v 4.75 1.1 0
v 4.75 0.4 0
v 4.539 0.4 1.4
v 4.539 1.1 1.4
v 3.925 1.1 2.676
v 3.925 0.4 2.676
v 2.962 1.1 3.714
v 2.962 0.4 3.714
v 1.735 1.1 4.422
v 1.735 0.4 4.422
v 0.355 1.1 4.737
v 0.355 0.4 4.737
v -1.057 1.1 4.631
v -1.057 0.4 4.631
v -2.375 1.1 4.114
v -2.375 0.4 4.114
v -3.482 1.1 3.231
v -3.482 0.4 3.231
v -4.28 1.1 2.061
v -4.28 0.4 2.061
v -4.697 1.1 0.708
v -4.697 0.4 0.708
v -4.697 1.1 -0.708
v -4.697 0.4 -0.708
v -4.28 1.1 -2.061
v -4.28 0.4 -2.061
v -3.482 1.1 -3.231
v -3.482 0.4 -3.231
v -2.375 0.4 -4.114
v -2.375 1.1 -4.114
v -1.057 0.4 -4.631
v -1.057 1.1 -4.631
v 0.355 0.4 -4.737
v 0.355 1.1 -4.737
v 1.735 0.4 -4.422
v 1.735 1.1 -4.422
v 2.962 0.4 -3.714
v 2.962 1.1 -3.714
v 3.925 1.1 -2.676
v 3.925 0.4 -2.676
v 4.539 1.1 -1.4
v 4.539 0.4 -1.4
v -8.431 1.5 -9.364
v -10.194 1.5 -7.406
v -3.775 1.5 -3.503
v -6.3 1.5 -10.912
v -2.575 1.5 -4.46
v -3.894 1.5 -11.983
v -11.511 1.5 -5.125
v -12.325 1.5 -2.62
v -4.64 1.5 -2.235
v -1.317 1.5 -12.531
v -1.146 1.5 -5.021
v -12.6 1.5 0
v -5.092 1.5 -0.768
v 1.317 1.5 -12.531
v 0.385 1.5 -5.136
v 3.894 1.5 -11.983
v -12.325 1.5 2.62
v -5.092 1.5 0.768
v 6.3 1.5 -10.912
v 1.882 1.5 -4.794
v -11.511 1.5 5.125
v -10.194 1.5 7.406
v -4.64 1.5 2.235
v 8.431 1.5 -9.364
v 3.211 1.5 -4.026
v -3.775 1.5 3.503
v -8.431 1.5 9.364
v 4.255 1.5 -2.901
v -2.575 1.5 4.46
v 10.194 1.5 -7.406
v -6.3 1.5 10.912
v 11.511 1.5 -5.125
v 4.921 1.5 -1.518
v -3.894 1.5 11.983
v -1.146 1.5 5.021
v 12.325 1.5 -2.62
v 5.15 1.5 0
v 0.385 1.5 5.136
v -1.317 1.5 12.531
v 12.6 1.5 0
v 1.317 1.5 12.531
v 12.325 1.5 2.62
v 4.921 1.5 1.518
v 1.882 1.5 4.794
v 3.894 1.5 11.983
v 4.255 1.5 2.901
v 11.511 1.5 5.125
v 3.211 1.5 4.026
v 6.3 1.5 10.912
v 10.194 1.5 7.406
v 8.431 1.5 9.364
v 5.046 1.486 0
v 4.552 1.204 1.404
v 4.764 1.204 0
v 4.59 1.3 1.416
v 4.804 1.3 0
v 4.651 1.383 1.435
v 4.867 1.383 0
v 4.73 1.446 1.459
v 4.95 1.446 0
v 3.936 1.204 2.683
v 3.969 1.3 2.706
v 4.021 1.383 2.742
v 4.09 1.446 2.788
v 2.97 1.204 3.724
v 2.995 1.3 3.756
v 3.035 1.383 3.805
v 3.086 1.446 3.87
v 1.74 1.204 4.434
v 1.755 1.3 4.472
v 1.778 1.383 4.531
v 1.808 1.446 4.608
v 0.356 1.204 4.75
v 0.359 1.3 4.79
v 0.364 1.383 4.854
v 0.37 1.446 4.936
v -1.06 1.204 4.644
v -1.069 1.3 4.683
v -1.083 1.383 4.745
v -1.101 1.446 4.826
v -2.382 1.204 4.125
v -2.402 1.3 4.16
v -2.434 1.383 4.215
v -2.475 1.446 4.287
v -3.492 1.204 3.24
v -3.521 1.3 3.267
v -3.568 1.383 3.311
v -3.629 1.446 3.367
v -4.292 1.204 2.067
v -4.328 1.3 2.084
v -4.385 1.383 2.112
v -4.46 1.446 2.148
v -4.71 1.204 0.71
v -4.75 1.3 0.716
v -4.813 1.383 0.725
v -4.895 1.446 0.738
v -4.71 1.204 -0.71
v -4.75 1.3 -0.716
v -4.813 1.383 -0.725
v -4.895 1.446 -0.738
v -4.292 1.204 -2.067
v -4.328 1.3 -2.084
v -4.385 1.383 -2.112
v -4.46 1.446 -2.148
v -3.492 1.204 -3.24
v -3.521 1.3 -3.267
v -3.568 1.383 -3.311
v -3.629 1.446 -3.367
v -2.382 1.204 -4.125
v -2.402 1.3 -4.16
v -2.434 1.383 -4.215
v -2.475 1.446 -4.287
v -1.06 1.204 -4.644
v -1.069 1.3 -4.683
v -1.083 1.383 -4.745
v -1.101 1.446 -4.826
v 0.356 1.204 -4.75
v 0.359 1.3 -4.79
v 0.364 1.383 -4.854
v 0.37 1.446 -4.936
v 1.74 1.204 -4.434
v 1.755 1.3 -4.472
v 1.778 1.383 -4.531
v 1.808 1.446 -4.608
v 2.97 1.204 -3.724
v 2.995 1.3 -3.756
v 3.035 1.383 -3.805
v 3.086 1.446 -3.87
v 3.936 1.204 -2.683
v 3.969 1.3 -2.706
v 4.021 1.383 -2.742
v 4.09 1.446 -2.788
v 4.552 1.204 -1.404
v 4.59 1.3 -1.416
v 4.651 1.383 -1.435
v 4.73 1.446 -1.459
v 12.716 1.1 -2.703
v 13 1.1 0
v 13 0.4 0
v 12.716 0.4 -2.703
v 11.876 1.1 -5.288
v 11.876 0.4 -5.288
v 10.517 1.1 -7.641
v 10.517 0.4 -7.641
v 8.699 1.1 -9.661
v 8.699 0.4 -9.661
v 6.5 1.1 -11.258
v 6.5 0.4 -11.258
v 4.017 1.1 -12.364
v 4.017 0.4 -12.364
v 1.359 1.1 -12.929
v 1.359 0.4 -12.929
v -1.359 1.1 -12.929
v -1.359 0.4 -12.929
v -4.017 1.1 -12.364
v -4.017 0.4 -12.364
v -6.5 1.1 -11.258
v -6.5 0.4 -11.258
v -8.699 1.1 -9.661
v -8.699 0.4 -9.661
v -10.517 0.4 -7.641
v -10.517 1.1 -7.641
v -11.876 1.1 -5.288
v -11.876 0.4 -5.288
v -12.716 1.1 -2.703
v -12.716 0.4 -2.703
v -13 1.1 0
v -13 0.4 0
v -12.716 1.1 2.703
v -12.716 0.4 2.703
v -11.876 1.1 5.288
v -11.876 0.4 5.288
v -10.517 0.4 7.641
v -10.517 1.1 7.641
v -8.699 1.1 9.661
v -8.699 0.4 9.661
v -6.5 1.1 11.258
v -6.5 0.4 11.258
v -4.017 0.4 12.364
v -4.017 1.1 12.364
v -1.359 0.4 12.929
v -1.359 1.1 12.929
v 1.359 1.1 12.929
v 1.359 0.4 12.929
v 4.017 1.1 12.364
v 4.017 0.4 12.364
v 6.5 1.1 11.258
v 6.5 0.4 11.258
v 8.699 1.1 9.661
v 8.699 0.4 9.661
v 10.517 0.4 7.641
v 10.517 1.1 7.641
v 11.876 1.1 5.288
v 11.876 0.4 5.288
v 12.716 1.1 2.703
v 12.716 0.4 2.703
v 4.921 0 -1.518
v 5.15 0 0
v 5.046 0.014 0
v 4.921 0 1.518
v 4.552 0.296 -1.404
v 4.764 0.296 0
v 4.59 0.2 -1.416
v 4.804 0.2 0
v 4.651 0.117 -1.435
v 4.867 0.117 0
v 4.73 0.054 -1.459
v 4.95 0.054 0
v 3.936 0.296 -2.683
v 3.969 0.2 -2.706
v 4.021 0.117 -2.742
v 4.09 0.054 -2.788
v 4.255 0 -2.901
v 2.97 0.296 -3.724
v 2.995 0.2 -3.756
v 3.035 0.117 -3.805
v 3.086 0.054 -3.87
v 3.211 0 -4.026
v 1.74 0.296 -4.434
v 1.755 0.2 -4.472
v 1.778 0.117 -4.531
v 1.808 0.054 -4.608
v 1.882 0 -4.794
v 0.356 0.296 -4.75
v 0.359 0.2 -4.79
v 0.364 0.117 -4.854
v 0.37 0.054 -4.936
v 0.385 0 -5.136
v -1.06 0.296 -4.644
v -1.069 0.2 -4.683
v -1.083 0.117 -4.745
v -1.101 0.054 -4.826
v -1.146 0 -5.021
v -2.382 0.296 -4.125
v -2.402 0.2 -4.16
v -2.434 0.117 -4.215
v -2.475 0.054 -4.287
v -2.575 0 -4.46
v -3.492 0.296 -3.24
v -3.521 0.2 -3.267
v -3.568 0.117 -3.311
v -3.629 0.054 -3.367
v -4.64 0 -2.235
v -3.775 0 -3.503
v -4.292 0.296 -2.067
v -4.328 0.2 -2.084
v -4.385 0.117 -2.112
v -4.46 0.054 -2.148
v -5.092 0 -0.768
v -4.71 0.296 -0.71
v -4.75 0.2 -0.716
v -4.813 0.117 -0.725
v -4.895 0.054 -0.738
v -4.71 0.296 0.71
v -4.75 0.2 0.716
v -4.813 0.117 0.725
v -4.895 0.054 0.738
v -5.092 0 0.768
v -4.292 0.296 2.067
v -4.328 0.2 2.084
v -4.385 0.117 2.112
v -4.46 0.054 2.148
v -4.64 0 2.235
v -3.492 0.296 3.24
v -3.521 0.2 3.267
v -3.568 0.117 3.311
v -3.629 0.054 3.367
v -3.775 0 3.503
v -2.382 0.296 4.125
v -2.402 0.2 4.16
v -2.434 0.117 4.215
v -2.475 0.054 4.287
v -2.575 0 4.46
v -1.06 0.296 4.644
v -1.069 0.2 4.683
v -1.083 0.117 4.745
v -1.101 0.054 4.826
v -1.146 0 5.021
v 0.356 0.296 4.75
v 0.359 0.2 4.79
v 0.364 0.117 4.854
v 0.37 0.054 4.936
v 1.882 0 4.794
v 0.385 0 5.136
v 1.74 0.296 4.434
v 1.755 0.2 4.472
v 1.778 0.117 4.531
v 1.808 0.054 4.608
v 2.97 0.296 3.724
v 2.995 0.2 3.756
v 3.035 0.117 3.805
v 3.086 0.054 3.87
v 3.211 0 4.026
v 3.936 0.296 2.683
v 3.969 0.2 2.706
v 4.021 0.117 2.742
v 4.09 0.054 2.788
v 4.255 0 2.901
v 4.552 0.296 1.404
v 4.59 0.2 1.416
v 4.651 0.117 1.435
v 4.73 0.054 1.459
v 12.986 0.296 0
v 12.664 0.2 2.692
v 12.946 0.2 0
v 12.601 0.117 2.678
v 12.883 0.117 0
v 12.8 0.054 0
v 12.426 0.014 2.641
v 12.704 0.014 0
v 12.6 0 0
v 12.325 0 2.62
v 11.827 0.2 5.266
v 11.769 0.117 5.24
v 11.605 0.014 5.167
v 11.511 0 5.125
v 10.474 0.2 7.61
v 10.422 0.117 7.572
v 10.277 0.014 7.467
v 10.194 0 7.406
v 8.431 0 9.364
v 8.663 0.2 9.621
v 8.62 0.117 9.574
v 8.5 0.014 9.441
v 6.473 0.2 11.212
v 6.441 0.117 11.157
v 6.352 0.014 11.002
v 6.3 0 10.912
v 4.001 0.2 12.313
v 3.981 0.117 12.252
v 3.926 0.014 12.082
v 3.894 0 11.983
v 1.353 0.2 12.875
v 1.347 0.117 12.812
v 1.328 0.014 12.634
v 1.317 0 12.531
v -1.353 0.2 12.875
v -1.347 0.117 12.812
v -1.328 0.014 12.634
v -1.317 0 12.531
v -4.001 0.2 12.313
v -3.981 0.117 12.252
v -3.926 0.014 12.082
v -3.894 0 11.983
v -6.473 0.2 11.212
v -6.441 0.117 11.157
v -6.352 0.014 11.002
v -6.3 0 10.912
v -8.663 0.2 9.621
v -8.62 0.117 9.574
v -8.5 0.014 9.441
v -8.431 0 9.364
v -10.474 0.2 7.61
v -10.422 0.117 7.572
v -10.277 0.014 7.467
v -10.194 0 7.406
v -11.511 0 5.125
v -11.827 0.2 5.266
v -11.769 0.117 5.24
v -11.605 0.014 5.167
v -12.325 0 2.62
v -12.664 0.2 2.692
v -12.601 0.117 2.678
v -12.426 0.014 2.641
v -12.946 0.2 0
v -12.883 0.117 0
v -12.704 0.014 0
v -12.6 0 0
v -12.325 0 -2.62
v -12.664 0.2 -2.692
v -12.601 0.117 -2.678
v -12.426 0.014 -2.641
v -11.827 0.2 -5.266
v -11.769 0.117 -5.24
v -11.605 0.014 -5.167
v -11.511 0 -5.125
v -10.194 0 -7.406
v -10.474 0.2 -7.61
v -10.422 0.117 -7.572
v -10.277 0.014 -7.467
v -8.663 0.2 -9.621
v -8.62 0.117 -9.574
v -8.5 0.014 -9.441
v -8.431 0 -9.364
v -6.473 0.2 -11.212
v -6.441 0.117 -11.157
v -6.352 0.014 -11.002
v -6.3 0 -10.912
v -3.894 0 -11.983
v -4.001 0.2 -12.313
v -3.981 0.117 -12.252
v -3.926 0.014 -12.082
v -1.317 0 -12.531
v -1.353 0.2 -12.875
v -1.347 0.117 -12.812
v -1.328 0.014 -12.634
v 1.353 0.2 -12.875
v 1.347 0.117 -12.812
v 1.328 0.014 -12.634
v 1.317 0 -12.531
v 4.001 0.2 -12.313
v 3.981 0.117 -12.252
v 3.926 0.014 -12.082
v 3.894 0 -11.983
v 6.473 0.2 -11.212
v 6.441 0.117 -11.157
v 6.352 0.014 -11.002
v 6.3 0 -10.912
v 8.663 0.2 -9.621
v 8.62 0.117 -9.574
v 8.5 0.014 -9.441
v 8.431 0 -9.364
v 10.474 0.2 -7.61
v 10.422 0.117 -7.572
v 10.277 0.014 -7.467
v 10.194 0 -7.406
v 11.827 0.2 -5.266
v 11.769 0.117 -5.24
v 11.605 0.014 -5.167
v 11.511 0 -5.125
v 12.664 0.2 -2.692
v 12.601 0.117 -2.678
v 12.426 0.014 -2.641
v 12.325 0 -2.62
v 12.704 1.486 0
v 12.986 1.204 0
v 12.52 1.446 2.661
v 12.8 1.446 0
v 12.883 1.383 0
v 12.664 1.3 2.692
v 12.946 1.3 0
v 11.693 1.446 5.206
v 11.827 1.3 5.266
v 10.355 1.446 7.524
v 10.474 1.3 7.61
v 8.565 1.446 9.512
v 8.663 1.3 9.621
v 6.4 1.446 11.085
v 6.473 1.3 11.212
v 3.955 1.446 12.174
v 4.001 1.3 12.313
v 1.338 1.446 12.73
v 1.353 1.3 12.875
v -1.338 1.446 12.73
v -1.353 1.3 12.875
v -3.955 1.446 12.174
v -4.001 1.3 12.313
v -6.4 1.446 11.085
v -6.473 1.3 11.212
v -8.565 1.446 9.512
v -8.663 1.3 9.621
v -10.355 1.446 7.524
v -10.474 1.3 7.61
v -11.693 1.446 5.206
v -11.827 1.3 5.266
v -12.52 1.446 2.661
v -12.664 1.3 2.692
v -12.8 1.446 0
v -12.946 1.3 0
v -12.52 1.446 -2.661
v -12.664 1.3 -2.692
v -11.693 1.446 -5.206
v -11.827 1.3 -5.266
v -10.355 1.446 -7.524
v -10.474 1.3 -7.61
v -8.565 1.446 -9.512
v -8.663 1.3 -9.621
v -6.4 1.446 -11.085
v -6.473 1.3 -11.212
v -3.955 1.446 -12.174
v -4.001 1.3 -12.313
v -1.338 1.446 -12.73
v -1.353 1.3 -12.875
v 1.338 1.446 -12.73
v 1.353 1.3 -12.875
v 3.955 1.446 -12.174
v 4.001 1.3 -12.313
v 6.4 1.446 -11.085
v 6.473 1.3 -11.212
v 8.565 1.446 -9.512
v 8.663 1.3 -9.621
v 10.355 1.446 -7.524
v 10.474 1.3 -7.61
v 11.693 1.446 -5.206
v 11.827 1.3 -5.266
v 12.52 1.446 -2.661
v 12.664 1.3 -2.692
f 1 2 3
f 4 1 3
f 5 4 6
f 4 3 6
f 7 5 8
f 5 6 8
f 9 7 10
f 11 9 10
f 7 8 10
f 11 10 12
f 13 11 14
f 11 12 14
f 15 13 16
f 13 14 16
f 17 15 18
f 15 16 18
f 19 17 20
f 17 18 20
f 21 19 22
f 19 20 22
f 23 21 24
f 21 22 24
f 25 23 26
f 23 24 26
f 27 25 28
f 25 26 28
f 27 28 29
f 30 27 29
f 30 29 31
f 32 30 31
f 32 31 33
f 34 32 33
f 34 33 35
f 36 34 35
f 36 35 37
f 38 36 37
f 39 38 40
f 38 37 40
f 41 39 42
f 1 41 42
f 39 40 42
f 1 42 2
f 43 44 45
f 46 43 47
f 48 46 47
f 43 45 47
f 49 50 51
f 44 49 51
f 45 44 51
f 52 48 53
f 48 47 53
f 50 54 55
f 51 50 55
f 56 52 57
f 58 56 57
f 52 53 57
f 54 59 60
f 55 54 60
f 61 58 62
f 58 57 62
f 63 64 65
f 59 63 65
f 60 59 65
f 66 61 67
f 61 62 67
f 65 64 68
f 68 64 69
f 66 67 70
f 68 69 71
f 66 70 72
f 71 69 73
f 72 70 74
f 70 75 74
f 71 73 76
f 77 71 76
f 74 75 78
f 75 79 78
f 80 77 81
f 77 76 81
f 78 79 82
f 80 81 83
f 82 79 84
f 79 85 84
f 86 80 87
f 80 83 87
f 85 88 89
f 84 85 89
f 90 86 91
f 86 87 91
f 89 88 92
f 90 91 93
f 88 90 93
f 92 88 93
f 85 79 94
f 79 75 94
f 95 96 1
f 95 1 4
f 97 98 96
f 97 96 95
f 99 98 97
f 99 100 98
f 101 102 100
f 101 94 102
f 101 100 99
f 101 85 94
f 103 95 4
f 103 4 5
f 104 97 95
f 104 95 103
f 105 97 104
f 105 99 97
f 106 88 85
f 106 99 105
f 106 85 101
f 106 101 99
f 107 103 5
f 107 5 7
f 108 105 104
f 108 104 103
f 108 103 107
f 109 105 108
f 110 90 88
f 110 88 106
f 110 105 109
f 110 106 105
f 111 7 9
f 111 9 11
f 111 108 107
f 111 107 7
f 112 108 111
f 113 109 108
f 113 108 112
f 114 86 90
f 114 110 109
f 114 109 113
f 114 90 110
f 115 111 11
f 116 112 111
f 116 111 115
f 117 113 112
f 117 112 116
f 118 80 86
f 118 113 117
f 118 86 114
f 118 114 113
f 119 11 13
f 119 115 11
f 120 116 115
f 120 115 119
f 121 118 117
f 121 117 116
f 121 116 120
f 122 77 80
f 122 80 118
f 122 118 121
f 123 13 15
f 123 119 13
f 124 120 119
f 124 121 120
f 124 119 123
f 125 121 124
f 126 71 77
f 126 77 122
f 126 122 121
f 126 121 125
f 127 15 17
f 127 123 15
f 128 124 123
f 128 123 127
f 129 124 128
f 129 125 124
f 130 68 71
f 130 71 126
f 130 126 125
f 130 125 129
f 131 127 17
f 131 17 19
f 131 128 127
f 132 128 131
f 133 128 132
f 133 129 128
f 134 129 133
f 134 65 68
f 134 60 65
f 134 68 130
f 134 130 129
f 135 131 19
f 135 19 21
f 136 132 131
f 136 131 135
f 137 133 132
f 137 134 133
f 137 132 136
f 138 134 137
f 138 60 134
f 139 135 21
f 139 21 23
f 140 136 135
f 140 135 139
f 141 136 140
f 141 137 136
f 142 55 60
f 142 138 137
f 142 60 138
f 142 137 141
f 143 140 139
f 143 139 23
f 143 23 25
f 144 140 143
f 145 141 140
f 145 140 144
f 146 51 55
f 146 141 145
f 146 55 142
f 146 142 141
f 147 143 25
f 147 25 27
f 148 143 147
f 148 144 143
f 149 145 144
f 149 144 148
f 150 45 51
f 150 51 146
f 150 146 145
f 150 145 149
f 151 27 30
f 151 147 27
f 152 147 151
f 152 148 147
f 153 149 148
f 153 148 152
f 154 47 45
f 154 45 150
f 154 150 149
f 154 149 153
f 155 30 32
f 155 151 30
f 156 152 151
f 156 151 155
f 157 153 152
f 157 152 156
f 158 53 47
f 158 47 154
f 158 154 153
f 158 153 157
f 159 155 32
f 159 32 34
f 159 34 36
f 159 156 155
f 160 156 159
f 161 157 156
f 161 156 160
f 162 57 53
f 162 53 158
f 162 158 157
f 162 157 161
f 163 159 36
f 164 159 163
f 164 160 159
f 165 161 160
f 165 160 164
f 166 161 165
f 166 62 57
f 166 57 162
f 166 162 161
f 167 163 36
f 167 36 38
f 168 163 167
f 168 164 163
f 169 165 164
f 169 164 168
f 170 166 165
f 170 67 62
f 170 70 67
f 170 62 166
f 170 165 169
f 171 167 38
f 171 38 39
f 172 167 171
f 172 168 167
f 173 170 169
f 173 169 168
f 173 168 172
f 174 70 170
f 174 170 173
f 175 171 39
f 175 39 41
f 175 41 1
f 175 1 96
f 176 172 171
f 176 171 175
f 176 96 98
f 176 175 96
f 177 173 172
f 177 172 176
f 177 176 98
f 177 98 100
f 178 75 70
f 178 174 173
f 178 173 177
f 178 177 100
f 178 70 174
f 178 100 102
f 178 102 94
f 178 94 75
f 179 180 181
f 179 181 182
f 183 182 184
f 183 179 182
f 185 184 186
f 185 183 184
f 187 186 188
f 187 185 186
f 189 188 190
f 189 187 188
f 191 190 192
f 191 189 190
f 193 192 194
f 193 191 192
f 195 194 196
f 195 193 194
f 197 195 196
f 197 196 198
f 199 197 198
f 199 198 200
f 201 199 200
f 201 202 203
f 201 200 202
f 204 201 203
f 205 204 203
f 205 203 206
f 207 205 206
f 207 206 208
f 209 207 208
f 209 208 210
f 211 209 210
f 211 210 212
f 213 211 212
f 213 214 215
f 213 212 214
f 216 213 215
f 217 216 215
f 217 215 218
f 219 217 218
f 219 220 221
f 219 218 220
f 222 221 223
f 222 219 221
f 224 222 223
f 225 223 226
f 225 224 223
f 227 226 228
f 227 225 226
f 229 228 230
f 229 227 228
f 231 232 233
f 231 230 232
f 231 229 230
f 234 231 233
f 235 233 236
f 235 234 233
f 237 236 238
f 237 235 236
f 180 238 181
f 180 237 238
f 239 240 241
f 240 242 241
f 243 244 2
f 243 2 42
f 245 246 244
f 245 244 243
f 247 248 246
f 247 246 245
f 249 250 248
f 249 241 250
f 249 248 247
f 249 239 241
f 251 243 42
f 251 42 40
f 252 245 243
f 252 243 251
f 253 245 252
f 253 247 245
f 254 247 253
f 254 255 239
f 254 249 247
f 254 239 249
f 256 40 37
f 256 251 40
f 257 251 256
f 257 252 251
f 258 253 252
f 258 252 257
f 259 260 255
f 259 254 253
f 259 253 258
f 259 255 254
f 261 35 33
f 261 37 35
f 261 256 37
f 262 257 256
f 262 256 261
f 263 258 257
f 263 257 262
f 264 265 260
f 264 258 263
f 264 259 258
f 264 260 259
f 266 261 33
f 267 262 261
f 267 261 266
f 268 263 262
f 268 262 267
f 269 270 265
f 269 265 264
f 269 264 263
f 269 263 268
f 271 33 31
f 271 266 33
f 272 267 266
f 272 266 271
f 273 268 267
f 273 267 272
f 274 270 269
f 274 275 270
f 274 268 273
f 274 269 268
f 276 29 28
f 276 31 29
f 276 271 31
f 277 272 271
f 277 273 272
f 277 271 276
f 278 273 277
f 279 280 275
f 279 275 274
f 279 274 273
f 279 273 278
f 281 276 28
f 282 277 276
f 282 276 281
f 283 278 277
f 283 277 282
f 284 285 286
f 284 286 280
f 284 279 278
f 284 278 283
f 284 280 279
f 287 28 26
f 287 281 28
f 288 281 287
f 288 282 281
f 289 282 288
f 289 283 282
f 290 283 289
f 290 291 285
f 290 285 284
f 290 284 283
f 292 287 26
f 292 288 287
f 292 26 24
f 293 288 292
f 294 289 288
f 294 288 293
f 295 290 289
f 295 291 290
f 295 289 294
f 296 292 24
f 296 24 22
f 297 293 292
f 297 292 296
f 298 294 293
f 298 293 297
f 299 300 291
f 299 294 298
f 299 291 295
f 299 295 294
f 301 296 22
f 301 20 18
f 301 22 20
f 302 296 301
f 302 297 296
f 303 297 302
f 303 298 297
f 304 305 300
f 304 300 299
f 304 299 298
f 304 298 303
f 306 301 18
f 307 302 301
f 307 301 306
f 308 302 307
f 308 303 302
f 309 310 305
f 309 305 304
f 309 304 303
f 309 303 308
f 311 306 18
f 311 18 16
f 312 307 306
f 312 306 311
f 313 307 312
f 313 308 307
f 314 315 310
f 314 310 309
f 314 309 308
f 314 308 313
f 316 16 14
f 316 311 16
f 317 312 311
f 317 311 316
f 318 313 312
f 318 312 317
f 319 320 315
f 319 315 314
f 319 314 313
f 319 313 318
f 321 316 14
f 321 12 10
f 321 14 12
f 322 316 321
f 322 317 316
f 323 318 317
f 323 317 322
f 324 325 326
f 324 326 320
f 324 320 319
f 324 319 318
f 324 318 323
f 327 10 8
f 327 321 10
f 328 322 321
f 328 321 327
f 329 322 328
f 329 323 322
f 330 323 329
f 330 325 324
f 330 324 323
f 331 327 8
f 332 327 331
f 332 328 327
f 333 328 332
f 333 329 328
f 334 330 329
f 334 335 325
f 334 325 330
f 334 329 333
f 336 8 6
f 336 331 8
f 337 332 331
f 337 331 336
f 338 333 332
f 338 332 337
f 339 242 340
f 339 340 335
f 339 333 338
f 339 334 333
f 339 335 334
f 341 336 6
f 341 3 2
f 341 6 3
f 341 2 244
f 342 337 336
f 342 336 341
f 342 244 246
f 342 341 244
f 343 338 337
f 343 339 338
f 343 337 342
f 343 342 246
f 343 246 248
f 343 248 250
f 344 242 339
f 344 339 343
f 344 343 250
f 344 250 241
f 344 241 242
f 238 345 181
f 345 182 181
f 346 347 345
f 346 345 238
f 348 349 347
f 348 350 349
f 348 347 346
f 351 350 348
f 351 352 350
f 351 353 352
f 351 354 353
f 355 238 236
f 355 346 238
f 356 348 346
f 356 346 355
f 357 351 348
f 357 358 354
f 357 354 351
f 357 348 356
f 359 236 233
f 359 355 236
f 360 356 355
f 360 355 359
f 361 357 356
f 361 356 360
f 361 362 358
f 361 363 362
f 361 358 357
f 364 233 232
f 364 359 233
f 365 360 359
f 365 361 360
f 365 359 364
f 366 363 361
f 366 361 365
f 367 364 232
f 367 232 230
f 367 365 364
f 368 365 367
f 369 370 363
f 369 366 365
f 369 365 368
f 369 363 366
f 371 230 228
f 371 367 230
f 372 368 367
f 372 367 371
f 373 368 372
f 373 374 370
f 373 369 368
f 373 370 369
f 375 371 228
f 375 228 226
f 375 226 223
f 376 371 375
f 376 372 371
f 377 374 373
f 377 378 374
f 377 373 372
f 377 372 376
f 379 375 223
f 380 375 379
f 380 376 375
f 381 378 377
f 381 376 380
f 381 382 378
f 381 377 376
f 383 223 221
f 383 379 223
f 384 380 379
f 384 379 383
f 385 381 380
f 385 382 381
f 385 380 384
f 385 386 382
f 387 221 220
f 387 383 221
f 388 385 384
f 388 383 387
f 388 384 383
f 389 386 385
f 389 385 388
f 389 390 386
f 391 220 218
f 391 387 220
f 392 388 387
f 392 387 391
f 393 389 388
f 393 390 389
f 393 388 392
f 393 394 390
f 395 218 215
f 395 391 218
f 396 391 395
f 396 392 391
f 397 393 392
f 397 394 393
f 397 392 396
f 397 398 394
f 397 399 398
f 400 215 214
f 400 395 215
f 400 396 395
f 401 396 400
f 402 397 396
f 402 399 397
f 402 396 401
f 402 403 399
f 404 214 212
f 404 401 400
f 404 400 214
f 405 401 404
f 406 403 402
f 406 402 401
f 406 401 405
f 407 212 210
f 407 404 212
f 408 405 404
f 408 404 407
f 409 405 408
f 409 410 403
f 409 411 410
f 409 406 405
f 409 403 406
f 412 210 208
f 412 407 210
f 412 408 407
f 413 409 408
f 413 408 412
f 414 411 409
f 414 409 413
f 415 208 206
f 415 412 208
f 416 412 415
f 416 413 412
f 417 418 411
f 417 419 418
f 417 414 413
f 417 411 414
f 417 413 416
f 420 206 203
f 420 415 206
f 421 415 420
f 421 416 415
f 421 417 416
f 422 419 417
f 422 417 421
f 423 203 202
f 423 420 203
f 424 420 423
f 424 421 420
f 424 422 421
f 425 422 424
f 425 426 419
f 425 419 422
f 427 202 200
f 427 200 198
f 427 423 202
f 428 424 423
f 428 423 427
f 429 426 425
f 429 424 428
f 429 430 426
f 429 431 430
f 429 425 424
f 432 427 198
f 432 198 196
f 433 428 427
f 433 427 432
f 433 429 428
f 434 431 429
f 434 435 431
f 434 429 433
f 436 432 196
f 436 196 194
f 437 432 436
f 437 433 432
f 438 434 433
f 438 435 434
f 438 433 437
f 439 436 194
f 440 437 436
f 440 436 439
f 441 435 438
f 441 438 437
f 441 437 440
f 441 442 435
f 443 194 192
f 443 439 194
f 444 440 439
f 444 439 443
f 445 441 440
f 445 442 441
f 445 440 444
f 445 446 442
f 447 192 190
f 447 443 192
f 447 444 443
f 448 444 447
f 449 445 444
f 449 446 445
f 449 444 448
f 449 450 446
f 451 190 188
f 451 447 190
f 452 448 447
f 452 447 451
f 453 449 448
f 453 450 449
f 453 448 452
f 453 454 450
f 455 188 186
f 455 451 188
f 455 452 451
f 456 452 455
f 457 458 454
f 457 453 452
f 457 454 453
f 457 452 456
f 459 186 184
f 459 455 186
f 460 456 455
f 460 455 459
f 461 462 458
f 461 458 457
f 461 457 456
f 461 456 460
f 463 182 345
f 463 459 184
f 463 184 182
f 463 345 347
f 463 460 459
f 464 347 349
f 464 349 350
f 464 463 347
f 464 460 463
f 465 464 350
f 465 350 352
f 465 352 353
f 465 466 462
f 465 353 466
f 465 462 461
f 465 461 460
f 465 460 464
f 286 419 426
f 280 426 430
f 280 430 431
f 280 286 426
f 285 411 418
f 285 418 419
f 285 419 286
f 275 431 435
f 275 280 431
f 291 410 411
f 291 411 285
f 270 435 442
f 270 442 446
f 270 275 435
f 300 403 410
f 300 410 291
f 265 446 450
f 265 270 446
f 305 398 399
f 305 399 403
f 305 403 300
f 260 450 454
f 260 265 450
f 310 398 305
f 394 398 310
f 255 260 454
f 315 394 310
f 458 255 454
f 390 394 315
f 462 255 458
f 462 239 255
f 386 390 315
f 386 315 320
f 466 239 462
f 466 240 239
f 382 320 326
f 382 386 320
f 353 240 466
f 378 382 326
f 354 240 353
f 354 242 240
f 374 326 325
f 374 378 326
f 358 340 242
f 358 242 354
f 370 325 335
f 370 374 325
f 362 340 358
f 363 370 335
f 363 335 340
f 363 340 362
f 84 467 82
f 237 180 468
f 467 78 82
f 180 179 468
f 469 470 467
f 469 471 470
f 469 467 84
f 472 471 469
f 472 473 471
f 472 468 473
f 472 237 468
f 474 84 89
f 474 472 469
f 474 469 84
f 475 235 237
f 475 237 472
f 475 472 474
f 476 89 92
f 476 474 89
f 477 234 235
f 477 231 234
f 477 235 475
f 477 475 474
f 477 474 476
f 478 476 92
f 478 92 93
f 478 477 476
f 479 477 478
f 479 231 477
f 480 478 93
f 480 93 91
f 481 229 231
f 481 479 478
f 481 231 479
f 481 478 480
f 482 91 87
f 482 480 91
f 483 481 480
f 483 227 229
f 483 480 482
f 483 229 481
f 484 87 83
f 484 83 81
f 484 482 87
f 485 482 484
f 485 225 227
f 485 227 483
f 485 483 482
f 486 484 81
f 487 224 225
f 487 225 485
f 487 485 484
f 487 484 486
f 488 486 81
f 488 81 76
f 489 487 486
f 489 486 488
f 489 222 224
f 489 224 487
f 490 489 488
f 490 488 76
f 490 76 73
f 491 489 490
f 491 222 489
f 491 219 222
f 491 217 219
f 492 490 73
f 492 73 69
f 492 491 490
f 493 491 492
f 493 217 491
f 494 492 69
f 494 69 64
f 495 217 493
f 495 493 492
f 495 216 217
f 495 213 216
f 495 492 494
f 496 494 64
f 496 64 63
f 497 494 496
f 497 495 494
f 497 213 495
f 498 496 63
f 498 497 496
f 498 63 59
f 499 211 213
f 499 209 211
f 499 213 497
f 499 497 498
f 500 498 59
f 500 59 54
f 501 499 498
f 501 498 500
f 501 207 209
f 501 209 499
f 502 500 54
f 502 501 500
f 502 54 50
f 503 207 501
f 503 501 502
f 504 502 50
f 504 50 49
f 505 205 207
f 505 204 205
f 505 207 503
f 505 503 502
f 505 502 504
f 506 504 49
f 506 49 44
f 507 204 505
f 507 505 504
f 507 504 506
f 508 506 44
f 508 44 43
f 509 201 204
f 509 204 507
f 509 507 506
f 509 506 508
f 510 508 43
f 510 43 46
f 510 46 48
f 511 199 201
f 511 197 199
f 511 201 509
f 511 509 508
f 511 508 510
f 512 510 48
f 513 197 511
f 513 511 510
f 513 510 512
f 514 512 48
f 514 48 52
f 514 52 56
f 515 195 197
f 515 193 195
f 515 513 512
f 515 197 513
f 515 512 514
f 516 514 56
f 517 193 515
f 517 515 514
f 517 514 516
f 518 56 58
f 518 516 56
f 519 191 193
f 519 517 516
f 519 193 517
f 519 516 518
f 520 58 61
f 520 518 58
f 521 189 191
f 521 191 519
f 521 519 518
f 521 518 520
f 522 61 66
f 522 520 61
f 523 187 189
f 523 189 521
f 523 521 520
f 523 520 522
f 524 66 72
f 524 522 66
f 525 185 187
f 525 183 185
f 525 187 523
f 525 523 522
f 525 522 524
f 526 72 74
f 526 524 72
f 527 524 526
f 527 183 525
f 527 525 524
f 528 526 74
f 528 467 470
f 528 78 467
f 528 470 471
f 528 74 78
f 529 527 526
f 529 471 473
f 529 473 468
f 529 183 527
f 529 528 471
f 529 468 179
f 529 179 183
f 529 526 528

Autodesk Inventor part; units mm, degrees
ref_plane "YZ Plane" through (0, 0, 0) normal (1, 0, 0) x (0, 1, 0)
ref_plane "XZ Plane" through (0, 0, 0) normal (0, 1, 0) x (-1, 0, 0)
ref_plane "XY Plane" through (0, 0, 0) normal (0, 0, 1) x (1, 0, 0)
sketch "Эскиз1" plane through (0, 0, 0) normal (0, 0, 1) x (1, 0, 0)
  line L0 (4.75, 0) -> (13, 0)
  line L1 (13, 0) -> (13, 1.5)
  line L2 (13, 1.5) -> (4.75, 1.5)
  line L3 (0, 1.5) -> (0, 0)
  line L4 (4.75, 1.5) -> (4.75, 0)
  dimension "d0" = 26
  dimension "d3" = 1.5
  dimension "d7" = 9.5
revolve "Вращение1" add sketch "Эскиз1" angle 360 about axis through (0, 1.5, 0) along (0, -1, 0)
fillet "Сопряжение3" radius 0.4 4 edges at (-13, 0, 0) (-13, 1.5, 0) (-4.75, 0, 0) (-4.75, 1.5, 0)
equation "\"d3\" = d2"
equation "\"d2\" = 1.5"
properties part number "paris_washer"
